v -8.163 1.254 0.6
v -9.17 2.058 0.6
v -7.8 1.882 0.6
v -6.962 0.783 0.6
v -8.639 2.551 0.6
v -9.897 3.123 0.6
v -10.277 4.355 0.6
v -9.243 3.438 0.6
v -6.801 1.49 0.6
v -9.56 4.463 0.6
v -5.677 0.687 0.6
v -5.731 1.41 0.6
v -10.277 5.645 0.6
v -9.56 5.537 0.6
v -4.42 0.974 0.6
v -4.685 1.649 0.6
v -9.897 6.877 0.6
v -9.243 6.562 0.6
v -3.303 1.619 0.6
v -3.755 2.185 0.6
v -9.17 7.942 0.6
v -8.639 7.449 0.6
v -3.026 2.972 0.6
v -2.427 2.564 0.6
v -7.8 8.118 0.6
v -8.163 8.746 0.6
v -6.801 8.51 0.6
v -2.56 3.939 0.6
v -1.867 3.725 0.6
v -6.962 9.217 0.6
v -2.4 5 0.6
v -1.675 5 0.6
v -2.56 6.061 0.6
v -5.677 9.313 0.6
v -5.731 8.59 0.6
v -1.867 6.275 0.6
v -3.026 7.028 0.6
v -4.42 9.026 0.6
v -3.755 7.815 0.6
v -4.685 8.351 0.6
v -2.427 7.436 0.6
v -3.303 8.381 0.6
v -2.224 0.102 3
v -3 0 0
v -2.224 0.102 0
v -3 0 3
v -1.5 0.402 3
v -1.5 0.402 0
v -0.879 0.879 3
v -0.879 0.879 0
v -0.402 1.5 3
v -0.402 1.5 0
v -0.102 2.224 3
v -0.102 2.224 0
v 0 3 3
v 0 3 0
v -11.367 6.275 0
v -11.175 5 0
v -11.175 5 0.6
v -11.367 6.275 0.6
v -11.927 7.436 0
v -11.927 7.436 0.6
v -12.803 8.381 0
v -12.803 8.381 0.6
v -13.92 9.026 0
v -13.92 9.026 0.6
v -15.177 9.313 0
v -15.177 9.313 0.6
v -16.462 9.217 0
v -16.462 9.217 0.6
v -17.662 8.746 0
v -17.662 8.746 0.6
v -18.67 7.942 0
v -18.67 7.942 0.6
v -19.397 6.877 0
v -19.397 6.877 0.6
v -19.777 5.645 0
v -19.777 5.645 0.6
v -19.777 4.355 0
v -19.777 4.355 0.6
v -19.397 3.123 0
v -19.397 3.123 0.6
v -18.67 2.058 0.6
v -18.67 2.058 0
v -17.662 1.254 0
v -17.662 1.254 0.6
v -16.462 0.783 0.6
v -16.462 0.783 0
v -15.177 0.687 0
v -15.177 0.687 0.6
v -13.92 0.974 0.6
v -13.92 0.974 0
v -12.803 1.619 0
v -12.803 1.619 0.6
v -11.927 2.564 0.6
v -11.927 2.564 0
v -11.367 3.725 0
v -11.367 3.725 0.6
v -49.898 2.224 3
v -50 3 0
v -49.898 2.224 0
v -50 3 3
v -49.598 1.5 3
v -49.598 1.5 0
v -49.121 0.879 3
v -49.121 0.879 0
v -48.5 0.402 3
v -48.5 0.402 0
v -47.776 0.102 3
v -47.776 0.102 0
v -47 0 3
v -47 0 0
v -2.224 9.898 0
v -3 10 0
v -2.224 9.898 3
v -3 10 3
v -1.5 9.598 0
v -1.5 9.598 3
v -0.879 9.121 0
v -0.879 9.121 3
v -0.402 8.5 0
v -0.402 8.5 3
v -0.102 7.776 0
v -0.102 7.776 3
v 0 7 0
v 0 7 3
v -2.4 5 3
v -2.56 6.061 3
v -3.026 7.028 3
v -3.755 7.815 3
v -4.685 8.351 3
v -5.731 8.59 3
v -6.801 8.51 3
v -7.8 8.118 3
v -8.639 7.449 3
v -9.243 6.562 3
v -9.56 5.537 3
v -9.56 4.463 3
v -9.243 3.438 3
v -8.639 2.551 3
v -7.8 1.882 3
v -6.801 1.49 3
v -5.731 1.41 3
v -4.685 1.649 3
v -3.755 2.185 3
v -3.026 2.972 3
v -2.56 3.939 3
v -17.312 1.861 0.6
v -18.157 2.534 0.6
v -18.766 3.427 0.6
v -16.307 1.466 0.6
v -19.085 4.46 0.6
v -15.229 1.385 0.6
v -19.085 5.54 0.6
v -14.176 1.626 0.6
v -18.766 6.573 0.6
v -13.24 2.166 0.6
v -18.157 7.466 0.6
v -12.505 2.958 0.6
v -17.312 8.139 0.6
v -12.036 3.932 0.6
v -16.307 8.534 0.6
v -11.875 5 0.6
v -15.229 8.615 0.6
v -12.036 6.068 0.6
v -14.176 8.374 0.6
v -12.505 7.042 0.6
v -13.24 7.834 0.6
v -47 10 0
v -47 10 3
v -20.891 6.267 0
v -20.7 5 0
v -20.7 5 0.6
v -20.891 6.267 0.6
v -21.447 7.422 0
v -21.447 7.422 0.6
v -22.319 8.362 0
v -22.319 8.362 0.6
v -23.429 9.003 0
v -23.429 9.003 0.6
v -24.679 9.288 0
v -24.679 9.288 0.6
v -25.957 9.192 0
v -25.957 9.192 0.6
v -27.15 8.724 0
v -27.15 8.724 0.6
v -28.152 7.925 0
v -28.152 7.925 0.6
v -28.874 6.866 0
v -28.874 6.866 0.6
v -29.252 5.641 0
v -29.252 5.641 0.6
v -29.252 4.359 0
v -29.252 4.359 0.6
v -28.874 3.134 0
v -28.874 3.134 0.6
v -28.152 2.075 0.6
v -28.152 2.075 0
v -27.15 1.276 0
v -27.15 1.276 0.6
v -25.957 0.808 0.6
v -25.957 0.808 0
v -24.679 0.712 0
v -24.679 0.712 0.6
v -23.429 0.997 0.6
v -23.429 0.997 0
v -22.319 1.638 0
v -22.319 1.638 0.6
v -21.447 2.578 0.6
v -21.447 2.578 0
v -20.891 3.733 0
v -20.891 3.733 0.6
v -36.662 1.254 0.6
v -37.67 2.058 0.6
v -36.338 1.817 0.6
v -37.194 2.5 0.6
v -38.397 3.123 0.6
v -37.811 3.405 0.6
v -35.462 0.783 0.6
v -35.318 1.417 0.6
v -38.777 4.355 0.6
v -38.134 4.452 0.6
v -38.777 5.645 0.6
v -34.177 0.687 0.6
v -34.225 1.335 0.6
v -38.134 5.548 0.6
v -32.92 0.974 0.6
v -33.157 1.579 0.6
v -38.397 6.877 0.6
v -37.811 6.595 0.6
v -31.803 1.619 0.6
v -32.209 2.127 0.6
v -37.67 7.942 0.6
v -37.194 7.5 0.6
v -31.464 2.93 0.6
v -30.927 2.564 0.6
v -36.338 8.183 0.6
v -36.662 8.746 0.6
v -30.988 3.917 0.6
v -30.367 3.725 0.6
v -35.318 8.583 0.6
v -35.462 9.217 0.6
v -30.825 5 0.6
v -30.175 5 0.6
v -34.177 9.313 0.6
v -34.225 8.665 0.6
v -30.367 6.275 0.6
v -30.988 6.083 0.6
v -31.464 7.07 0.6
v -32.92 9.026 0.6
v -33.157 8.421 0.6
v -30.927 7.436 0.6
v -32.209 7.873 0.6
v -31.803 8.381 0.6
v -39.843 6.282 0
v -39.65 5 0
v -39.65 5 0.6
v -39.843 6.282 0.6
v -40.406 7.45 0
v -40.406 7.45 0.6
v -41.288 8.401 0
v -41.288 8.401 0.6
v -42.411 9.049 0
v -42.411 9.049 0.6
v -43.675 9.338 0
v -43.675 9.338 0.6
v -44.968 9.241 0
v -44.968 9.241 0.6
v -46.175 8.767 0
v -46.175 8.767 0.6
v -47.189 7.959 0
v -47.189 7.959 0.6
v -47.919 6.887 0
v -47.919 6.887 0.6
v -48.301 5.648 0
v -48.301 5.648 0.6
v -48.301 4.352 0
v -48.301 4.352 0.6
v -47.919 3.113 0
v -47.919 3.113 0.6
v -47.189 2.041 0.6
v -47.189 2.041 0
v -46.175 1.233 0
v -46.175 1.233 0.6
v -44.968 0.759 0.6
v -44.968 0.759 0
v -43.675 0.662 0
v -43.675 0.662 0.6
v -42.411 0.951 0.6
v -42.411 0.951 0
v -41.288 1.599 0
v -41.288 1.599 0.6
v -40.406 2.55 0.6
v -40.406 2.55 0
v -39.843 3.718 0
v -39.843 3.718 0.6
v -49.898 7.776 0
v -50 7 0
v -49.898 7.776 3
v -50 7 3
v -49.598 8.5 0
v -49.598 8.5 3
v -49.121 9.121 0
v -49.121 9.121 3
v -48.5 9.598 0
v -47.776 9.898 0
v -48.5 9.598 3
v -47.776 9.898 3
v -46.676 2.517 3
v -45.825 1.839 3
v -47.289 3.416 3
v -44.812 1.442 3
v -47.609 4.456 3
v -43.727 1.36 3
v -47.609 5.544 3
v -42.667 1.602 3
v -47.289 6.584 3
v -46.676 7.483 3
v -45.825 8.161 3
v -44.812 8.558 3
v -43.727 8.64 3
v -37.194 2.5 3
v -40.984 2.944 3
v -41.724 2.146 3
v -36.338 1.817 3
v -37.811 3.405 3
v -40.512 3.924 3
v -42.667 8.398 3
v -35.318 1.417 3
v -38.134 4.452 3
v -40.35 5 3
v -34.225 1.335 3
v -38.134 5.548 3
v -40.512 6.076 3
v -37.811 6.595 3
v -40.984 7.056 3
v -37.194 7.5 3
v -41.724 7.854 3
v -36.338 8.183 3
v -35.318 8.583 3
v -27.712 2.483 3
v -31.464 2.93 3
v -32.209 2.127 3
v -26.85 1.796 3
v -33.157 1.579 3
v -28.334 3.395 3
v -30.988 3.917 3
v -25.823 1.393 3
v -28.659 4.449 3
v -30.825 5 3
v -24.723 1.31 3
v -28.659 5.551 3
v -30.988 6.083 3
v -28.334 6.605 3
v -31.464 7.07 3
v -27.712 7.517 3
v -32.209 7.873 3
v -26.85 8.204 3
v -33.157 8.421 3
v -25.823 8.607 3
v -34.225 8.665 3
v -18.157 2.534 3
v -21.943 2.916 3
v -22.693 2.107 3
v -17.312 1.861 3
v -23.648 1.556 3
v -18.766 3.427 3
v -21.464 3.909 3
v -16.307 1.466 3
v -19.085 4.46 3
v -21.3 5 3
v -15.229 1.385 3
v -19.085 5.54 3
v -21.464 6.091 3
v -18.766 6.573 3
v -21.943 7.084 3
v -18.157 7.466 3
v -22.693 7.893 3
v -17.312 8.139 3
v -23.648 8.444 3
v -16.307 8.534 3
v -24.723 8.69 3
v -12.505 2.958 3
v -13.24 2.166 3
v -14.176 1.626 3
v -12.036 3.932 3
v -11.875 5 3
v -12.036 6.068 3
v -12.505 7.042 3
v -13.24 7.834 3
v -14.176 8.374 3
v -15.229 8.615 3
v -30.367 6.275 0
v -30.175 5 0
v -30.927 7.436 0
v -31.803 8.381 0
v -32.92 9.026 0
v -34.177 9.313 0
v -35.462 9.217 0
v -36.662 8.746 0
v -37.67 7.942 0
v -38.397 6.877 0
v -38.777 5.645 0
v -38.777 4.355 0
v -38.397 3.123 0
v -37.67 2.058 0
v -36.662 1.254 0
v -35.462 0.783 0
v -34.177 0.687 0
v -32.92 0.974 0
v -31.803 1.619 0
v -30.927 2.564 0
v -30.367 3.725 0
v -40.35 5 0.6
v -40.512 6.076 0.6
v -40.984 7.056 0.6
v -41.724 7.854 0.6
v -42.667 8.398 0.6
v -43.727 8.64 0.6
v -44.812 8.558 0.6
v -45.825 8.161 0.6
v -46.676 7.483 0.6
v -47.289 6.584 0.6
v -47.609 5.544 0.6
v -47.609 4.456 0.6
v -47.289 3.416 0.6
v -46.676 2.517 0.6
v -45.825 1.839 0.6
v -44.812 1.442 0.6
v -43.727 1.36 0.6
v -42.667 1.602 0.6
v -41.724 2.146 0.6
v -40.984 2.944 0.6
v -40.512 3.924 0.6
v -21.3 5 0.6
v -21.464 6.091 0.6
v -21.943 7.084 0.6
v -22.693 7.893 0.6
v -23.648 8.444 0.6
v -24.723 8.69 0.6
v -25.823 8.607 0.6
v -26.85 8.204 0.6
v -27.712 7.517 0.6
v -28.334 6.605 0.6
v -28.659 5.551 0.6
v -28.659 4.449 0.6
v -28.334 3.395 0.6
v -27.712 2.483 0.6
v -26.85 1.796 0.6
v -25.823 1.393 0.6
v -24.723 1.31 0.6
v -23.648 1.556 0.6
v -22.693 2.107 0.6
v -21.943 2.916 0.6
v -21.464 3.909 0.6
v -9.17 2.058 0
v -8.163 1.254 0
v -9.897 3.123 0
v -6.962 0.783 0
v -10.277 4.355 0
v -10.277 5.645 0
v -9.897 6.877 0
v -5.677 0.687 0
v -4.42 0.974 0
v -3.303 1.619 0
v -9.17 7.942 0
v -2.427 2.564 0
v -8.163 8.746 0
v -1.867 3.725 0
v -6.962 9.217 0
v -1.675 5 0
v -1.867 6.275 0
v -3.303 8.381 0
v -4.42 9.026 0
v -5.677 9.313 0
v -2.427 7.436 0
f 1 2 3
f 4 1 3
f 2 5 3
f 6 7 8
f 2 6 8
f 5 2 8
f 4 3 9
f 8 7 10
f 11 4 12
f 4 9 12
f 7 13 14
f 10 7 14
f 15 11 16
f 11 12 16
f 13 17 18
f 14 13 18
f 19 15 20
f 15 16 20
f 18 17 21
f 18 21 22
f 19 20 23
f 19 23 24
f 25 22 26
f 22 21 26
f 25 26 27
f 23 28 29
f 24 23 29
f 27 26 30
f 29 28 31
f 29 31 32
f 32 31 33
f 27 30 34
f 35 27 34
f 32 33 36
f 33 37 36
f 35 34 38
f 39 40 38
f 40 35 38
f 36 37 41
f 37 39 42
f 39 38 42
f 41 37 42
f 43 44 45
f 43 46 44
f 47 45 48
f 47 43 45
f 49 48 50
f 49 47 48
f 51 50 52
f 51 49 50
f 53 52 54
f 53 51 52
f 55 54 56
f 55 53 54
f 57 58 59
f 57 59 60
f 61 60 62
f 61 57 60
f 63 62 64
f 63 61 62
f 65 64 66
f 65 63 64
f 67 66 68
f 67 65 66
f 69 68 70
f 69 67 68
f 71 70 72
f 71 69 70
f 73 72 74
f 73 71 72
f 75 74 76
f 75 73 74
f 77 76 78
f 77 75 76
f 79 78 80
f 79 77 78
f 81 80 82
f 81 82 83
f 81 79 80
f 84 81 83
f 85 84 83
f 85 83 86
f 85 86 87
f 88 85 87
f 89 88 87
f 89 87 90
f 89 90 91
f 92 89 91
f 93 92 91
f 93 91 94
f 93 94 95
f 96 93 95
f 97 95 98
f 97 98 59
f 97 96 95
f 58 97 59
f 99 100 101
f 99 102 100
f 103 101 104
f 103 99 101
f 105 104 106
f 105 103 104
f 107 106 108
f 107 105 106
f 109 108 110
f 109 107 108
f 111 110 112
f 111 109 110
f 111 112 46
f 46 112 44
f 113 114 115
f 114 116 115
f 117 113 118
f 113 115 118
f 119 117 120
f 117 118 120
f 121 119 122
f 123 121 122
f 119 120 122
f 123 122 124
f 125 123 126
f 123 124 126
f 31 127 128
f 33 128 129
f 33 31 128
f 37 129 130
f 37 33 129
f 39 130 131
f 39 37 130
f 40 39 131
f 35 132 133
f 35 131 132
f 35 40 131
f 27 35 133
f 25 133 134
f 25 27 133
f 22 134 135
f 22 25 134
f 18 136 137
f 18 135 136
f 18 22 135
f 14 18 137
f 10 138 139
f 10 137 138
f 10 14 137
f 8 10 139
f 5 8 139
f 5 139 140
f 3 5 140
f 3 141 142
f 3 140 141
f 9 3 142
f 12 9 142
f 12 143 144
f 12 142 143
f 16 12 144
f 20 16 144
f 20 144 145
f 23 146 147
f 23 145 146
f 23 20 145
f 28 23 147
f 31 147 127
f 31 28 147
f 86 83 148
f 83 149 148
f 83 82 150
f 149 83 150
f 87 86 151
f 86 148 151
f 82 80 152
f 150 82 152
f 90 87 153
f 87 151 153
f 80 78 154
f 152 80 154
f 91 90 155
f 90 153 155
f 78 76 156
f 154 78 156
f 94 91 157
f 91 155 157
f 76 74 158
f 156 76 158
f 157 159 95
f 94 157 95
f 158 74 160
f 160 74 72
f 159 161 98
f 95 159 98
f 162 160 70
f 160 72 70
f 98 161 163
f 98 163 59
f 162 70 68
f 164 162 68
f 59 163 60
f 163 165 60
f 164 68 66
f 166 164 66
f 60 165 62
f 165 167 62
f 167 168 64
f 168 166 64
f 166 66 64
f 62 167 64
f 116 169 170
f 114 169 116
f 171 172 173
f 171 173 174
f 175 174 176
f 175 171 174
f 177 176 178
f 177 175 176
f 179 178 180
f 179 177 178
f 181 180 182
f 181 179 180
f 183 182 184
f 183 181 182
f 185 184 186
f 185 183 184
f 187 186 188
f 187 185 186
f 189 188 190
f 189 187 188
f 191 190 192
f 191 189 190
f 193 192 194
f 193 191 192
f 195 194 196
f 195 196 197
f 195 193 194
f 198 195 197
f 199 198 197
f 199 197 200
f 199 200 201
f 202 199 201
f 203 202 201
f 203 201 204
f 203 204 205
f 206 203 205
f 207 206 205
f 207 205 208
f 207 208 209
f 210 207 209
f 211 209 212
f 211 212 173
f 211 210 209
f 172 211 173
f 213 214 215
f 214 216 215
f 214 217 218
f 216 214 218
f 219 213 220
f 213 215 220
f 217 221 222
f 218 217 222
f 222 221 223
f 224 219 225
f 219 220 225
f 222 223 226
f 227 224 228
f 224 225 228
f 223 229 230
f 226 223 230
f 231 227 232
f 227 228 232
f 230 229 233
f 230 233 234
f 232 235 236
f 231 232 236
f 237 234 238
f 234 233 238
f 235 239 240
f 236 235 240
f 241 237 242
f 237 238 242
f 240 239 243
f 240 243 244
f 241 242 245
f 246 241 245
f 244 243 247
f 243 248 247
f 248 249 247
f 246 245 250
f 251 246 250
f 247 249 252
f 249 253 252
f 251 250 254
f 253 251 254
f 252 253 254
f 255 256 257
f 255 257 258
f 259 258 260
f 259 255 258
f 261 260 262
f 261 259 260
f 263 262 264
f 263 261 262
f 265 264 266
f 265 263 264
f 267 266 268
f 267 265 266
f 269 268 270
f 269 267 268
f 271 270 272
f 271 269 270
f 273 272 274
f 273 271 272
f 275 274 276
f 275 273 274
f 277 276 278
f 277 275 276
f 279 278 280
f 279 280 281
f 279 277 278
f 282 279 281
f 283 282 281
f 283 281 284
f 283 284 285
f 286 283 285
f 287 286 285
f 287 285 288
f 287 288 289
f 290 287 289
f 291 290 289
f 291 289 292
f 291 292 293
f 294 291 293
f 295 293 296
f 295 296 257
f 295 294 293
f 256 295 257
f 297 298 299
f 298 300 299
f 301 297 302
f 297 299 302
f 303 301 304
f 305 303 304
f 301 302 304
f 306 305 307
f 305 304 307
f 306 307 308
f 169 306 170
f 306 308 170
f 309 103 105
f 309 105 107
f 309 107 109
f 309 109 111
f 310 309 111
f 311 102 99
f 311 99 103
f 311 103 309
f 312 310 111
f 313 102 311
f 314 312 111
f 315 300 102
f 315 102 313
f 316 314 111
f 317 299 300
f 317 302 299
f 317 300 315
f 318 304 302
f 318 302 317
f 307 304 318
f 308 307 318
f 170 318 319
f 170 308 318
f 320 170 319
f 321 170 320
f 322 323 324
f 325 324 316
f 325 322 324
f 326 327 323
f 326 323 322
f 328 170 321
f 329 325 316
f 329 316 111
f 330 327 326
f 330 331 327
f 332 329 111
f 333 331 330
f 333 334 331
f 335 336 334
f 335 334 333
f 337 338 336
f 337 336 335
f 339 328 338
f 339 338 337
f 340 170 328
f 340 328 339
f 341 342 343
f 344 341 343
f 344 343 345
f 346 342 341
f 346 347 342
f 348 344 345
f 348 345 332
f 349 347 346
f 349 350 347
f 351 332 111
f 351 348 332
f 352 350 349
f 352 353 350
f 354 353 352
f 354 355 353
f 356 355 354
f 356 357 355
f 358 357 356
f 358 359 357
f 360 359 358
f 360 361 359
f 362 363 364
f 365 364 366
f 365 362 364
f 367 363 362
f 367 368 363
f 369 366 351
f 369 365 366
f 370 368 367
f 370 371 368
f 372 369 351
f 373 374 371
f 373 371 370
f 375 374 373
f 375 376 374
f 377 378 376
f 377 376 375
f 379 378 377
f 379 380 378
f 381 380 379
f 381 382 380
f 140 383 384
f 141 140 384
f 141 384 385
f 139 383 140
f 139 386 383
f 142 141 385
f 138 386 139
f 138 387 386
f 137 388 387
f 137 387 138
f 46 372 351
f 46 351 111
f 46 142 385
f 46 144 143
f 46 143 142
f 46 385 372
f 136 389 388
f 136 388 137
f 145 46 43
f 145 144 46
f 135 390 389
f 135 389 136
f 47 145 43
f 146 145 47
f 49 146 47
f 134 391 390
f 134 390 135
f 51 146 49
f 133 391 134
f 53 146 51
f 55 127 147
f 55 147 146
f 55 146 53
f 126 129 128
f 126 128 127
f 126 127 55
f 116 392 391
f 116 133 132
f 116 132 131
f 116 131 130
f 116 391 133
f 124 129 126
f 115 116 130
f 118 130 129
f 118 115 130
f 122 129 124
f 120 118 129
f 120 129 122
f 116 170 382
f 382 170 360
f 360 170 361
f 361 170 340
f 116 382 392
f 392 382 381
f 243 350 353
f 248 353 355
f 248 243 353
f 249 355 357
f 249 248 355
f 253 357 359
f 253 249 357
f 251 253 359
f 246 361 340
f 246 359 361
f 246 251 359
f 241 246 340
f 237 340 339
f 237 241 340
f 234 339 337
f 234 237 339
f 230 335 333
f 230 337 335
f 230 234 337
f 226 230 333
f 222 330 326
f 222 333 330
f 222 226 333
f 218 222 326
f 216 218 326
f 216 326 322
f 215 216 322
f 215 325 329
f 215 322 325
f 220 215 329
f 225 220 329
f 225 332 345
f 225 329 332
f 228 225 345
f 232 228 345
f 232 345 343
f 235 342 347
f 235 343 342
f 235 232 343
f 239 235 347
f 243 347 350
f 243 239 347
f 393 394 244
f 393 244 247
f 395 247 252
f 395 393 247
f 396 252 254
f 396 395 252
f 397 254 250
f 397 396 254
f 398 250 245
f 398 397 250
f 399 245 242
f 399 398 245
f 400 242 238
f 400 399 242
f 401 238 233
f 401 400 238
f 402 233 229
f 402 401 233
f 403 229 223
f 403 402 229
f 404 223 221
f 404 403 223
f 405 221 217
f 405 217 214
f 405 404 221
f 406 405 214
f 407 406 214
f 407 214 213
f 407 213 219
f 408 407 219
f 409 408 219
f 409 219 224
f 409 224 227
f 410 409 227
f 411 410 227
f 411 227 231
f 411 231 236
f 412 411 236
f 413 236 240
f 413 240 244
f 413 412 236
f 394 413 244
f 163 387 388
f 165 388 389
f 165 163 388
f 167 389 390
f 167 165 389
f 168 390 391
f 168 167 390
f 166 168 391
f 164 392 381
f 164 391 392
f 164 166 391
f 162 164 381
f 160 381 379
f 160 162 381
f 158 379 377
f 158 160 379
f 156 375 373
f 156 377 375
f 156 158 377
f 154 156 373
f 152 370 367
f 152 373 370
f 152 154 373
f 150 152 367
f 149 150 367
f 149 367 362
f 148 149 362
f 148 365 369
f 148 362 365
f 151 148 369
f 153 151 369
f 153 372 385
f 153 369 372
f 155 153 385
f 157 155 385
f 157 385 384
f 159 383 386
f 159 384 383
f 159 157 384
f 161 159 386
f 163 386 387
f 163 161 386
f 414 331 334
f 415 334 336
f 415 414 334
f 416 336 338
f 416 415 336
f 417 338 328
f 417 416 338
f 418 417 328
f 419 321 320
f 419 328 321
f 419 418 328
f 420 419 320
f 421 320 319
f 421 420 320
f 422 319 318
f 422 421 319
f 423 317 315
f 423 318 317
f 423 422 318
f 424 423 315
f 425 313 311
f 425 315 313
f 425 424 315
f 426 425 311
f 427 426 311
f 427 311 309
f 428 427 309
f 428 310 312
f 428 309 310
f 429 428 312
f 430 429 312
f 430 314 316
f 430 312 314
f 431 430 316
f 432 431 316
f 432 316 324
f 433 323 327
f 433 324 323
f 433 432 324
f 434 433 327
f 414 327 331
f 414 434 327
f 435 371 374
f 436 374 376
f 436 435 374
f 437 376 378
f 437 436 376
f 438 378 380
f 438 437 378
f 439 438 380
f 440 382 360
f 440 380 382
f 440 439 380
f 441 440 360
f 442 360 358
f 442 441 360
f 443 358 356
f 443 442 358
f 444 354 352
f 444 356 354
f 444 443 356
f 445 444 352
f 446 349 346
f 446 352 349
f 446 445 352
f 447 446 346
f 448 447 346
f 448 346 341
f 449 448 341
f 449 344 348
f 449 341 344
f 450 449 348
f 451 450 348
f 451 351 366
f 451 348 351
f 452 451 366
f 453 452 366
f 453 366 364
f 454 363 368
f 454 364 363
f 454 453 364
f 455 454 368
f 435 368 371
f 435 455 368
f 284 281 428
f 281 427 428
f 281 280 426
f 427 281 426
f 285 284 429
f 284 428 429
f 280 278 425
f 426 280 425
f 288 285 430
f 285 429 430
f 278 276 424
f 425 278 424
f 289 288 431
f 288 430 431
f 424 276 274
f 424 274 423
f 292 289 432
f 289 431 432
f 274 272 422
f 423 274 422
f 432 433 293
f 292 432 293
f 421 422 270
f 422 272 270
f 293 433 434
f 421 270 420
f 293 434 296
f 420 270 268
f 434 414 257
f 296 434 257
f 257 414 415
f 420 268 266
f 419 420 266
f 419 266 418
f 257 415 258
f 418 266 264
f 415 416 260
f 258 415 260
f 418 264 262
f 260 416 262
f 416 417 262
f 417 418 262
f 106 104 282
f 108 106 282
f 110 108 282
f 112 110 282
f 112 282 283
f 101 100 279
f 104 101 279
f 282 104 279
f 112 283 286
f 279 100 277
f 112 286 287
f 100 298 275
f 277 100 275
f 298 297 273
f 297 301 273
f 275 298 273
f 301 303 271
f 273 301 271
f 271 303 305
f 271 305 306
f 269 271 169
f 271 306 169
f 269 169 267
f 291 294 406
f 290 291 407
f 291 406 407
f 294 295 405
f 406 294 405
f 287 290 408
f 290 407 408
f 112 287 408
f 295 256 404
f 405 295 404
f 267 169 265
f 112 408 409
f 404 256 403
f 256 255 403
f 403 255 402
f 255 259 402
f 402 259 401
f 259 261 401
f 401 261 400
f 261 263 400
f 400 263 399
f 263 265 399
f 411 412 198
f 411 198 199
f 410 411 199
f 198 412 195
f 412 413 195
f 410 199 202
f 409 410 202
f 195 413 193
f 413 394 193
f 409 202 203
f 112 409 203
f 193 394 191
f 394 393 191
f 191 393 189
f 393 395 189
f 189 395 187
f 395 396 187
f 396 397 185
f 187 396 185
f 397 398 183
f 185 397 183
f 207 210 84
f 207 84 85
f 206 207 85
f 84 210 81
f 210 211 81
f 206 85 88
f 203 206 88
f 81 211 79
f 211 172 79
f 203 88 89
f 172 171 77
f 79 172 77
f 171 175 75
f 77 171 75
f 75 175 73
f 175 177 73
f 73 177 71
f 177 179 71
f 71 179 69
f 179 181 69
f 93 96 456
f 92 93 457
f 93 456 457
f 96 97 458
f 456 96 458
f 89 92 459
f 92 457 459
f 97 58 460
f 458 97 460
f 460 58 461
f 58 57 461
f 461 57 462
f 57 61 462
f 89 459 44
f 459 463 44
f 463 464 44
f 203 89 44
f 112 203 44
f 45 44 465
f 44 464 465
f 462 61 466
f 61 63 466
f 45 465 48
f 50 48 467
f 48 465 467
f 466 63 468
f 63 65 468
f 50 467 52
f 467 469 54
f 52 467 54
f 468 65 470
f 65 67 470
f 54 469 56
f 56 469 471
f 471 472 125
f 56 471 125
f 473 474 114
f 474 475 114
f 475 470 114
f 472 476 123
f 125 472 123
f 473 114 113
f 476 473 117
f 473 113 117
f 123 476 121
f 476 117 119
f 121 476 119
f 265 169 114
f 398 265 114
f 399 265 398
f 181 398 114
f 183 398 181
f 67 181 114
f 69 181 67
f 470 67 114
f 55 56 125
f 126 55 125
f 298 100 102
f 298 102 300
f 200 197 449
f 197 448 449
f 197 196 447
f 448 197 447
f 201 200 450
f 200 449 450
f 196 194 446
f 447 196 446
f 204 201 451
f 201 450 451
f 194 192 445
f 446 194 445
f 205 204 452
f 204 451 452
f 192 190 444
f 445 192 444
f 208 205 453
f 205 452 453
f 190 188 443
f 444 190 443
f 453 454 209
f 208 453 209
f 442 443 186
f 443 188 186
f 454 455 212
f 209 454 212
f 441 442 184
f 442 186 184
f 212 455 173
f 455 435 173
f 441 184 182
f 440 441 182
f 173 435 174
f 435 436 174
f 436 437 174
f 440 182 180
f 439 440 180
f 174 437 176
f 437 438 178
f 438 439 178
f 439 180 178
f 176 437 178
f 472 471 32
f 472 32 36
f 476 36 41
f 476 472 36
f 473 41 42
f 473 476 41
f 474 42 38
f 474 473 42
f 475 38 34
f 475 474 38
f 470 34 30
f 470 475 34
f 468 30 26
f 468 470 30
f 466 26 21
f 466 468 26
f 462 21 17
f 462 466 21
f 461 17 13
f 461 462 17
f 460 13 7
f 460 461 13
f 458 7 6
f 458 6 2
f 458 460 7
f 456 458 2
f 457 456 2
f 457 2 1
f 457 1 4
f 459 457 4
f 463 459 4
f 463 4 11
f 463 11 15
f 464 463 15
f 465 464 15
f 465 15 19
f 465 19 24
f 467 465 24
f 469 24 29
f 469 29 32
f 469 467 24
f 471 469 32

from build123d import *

# Parameters (mm, degrees)
SKETCH_1_W          = 50
SKETCH_1_H          = 10
EXTRUDE_1_DEPTH     = 3
SKETCH_1_3_R        = 3.65
SKETCH_1_3_R_2      = 3.675
SKETCH_1_3_R_3      = 3.7
SKETCH_1_3_R_4      = 3.625
SKETCH_1_3_R_5      = 3.6
CUT_EXTRUDE_1_DEPTH = 52.078371156
SKETCH_1_4_R        = 4.35
SKETCH_1_4_R_2      = 3.65
SKETCH_1_4_R_3      = 4.325
SKETCH_1_4_R_4      = 3.675
SKETCH_1_4_R_5      = 4.3
SKETCH_1_4_R_6      = 3.7
SKETCH_1_4_R_7      = 3.625
SKETCH_1_4_R_8      = 3.6
CUT_EXTRUDE_2_DEPTH = 0.6
FILLET_4_R          = 3


with BuildPart() as part:
    # 草图1 → 凸台-拉伸1 (new body)
    with BuildSketch(Plane.XY):
        with Locations((-25, 5)):
            Rectangle(SKETCH_1_W, SKETCH_1_H)
    extrude(amount=EXTRUDE_1_DEPTH)

    # 草图1<3> → 切除-拉伸1 (cut, through all)
    with BuildSketch(Plane.XY):
        with Locations((-44, 5)):
            Circle(SKETCH_1_3_R)
        with Locations((-34.5, 5)):
            Circle(SKETCH_1_3_R_2)
        with Locations((-25, 5)):
            Circle(SKETCH_1_3_R_3)
        with Locations((-15.5, 5)):
            Circle(SKETCH_1_3_R_4)
        with Locations((-6, 5)):
            Circle(SKETCH_1_3_R_5)
    extrude(amount=CUT_EXTRUDE_1_DEPTH, mode=Mode.SUBTRACT)

    # 草图1<4> → 切除-拉伸2 (cut)
    # profile 1 of 5: a face of its own
    with BuildSketch(Plane.XY):
        with Locations((-44, 5)):
            Circle(SKETCH_1_4_R)
        with Locations((-44, 5)):
            Circle(SKETCH_1_4_R_2, mode=Mode.SUBTRACT)
    # profile 2 of 5: a face of its own
    with BuildSketch(Plane.XY):
        with Locations((-34.5, 5)):
            Circle(SKETCH_1_4_R_3)
        with Locations((-34.5, 5)):
            Circle(SKETCH_1_4_R_4, mode=Mode.SUBTRACT)
    # profile 3 of 5: a face of its own
    with BuildSketch(Plane.XY):
        with Locations((-25, 5)):
            Circle(SKETCH_1_4_R_5)
        with Locations((-25, 5)):
            Circle(SKETCH_1_4_R_6, mode=Mode.SUBTRACT)
    # profile 4 of 5: a face of its own
    with BuildSketch(Plane.XY):
        with Locations((-15.5, 5)):
            Circle(SKETCH_1_4_R_3)
        with Locations((-15.5, 5)):
            Circle(SKETCH_1_4_R_7, mode=Mode.SUBTRACT)
    # profile 5 of 5: a face of its own
    with BuildSketch(Plane.XY):
        with Locations((-6, 5)):
            Circle(SKETCH_1_4_R_3)
        with Locations((-6, 5)):
            Circle(SKETCH_1_4_R_8, mode=Mode.SUBTRACT)
    extrude(amount=CUT_EXTRUDE_2_DEPTH, mode=Mode.SUBTRACT)

    # 圆角4
    fillet_4_edges = [part.edges().sort_by_distance(p)[0] for p in [
        (-50, 10, 1.5),
        (-50, 0, 1.5),
        (0, 10, 1.5),
        (0, 0, 1.5),
    ]]
    fillet(fillet_4_edges, radius=FILLET_4_R)


solid = part.part
